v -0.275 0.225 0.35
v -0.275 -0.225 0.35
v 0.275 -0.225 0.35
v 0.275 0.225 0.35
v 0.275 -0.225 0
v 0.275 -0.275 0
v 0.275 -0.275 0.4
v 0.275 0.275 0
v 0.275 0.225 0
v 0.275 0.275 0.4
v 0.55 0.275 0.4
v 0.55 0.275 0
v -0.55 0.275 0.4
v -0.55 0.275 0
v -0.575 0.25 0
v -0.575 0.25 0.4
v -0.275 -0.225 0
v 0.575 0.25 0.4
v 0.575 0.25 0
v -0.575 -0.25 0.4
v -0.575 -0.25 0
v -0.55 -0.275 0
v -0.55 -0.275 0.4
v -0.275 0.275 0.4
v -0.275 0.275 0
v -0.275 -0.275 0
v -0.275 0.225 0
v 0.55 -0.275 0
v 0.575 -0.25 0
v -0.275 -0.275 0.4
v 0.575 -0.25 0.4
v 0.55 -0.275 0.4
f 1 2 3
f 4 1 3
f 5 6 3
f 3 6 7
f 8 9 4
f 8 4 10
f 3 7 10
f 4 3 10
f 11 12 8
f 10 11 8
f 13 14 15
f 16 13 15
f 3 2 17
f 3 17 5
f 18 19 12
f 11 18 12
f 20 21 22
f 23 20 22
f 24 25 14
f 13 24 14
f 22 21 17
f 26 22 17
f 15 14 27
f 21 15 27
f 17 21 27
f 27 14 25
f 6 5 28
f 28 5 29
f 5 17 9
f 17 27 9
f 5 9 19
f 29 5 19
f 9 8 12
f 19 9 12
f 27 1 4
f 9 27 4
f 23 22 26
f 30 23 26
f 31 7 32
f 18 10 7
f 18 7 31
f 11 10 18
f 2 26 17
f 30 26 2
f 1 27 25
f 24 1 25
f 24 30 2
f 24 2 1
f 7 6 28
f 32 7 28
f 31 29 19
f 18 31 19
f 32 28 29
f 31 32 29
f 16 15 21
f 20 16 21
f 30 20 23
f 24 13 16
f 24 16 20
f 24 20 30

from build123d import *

# Parameters (mm, degrees)
EXTRUDE1_DEPTH     = 0.4
SKETCH1_W          = 0.55
SKETCH1_H          = 0.05
CUT_EXTRUDE1_DEPTH = 1.4
SKETCH2_W          = 0.55
SKETCH2_H          = 0.05
CUT_EXTRUDE2_DEPTH = 5


with BuildPart() as part:
    # COMPONENT_OUTLINE → Extrude1 (new body)
    with BuildSketch(Plane.XY):
        Polygon((0.55, 0.275), (-0.55, 0.275), (-0.575, 0.25), (-0.575, -0.25), (-0.55, -0.275), (0.55, -0.275), (0.575, -0.25), (0.575, 0.25), align=None)
    extrude(amount=EXTRUDE1_DEPTH)

    # Sketch1 → Cut-Extrude1 (cut, through all)
    with BuildSketch(Plane.XY.offset(0.4)):
        with Locations((0, 0.25)):
            Rectangle(SKETCH1_W, SKETCH1_H)
        with Locations((0, -0.25)):
            Rectangle(SKETCH1_W, SKETCH1_H)
    extrude(amount=-CUT_EXTRUDE1_DEPTH, mode=Mode.SUBTRACT)

    # Sketch2 → Cut-Extrude2 (cut)
    with BuildSketch(Plane.XZ.offset(0.225)):
        with Locations((0, 0.375)):
            Rectangle(SKETCH2_W, SKETCH2_H)
    extrude(amount=-CUT_EXTRUDE2_DEPTH, mode=Mode.SUBTRACT)


solid = part.part
